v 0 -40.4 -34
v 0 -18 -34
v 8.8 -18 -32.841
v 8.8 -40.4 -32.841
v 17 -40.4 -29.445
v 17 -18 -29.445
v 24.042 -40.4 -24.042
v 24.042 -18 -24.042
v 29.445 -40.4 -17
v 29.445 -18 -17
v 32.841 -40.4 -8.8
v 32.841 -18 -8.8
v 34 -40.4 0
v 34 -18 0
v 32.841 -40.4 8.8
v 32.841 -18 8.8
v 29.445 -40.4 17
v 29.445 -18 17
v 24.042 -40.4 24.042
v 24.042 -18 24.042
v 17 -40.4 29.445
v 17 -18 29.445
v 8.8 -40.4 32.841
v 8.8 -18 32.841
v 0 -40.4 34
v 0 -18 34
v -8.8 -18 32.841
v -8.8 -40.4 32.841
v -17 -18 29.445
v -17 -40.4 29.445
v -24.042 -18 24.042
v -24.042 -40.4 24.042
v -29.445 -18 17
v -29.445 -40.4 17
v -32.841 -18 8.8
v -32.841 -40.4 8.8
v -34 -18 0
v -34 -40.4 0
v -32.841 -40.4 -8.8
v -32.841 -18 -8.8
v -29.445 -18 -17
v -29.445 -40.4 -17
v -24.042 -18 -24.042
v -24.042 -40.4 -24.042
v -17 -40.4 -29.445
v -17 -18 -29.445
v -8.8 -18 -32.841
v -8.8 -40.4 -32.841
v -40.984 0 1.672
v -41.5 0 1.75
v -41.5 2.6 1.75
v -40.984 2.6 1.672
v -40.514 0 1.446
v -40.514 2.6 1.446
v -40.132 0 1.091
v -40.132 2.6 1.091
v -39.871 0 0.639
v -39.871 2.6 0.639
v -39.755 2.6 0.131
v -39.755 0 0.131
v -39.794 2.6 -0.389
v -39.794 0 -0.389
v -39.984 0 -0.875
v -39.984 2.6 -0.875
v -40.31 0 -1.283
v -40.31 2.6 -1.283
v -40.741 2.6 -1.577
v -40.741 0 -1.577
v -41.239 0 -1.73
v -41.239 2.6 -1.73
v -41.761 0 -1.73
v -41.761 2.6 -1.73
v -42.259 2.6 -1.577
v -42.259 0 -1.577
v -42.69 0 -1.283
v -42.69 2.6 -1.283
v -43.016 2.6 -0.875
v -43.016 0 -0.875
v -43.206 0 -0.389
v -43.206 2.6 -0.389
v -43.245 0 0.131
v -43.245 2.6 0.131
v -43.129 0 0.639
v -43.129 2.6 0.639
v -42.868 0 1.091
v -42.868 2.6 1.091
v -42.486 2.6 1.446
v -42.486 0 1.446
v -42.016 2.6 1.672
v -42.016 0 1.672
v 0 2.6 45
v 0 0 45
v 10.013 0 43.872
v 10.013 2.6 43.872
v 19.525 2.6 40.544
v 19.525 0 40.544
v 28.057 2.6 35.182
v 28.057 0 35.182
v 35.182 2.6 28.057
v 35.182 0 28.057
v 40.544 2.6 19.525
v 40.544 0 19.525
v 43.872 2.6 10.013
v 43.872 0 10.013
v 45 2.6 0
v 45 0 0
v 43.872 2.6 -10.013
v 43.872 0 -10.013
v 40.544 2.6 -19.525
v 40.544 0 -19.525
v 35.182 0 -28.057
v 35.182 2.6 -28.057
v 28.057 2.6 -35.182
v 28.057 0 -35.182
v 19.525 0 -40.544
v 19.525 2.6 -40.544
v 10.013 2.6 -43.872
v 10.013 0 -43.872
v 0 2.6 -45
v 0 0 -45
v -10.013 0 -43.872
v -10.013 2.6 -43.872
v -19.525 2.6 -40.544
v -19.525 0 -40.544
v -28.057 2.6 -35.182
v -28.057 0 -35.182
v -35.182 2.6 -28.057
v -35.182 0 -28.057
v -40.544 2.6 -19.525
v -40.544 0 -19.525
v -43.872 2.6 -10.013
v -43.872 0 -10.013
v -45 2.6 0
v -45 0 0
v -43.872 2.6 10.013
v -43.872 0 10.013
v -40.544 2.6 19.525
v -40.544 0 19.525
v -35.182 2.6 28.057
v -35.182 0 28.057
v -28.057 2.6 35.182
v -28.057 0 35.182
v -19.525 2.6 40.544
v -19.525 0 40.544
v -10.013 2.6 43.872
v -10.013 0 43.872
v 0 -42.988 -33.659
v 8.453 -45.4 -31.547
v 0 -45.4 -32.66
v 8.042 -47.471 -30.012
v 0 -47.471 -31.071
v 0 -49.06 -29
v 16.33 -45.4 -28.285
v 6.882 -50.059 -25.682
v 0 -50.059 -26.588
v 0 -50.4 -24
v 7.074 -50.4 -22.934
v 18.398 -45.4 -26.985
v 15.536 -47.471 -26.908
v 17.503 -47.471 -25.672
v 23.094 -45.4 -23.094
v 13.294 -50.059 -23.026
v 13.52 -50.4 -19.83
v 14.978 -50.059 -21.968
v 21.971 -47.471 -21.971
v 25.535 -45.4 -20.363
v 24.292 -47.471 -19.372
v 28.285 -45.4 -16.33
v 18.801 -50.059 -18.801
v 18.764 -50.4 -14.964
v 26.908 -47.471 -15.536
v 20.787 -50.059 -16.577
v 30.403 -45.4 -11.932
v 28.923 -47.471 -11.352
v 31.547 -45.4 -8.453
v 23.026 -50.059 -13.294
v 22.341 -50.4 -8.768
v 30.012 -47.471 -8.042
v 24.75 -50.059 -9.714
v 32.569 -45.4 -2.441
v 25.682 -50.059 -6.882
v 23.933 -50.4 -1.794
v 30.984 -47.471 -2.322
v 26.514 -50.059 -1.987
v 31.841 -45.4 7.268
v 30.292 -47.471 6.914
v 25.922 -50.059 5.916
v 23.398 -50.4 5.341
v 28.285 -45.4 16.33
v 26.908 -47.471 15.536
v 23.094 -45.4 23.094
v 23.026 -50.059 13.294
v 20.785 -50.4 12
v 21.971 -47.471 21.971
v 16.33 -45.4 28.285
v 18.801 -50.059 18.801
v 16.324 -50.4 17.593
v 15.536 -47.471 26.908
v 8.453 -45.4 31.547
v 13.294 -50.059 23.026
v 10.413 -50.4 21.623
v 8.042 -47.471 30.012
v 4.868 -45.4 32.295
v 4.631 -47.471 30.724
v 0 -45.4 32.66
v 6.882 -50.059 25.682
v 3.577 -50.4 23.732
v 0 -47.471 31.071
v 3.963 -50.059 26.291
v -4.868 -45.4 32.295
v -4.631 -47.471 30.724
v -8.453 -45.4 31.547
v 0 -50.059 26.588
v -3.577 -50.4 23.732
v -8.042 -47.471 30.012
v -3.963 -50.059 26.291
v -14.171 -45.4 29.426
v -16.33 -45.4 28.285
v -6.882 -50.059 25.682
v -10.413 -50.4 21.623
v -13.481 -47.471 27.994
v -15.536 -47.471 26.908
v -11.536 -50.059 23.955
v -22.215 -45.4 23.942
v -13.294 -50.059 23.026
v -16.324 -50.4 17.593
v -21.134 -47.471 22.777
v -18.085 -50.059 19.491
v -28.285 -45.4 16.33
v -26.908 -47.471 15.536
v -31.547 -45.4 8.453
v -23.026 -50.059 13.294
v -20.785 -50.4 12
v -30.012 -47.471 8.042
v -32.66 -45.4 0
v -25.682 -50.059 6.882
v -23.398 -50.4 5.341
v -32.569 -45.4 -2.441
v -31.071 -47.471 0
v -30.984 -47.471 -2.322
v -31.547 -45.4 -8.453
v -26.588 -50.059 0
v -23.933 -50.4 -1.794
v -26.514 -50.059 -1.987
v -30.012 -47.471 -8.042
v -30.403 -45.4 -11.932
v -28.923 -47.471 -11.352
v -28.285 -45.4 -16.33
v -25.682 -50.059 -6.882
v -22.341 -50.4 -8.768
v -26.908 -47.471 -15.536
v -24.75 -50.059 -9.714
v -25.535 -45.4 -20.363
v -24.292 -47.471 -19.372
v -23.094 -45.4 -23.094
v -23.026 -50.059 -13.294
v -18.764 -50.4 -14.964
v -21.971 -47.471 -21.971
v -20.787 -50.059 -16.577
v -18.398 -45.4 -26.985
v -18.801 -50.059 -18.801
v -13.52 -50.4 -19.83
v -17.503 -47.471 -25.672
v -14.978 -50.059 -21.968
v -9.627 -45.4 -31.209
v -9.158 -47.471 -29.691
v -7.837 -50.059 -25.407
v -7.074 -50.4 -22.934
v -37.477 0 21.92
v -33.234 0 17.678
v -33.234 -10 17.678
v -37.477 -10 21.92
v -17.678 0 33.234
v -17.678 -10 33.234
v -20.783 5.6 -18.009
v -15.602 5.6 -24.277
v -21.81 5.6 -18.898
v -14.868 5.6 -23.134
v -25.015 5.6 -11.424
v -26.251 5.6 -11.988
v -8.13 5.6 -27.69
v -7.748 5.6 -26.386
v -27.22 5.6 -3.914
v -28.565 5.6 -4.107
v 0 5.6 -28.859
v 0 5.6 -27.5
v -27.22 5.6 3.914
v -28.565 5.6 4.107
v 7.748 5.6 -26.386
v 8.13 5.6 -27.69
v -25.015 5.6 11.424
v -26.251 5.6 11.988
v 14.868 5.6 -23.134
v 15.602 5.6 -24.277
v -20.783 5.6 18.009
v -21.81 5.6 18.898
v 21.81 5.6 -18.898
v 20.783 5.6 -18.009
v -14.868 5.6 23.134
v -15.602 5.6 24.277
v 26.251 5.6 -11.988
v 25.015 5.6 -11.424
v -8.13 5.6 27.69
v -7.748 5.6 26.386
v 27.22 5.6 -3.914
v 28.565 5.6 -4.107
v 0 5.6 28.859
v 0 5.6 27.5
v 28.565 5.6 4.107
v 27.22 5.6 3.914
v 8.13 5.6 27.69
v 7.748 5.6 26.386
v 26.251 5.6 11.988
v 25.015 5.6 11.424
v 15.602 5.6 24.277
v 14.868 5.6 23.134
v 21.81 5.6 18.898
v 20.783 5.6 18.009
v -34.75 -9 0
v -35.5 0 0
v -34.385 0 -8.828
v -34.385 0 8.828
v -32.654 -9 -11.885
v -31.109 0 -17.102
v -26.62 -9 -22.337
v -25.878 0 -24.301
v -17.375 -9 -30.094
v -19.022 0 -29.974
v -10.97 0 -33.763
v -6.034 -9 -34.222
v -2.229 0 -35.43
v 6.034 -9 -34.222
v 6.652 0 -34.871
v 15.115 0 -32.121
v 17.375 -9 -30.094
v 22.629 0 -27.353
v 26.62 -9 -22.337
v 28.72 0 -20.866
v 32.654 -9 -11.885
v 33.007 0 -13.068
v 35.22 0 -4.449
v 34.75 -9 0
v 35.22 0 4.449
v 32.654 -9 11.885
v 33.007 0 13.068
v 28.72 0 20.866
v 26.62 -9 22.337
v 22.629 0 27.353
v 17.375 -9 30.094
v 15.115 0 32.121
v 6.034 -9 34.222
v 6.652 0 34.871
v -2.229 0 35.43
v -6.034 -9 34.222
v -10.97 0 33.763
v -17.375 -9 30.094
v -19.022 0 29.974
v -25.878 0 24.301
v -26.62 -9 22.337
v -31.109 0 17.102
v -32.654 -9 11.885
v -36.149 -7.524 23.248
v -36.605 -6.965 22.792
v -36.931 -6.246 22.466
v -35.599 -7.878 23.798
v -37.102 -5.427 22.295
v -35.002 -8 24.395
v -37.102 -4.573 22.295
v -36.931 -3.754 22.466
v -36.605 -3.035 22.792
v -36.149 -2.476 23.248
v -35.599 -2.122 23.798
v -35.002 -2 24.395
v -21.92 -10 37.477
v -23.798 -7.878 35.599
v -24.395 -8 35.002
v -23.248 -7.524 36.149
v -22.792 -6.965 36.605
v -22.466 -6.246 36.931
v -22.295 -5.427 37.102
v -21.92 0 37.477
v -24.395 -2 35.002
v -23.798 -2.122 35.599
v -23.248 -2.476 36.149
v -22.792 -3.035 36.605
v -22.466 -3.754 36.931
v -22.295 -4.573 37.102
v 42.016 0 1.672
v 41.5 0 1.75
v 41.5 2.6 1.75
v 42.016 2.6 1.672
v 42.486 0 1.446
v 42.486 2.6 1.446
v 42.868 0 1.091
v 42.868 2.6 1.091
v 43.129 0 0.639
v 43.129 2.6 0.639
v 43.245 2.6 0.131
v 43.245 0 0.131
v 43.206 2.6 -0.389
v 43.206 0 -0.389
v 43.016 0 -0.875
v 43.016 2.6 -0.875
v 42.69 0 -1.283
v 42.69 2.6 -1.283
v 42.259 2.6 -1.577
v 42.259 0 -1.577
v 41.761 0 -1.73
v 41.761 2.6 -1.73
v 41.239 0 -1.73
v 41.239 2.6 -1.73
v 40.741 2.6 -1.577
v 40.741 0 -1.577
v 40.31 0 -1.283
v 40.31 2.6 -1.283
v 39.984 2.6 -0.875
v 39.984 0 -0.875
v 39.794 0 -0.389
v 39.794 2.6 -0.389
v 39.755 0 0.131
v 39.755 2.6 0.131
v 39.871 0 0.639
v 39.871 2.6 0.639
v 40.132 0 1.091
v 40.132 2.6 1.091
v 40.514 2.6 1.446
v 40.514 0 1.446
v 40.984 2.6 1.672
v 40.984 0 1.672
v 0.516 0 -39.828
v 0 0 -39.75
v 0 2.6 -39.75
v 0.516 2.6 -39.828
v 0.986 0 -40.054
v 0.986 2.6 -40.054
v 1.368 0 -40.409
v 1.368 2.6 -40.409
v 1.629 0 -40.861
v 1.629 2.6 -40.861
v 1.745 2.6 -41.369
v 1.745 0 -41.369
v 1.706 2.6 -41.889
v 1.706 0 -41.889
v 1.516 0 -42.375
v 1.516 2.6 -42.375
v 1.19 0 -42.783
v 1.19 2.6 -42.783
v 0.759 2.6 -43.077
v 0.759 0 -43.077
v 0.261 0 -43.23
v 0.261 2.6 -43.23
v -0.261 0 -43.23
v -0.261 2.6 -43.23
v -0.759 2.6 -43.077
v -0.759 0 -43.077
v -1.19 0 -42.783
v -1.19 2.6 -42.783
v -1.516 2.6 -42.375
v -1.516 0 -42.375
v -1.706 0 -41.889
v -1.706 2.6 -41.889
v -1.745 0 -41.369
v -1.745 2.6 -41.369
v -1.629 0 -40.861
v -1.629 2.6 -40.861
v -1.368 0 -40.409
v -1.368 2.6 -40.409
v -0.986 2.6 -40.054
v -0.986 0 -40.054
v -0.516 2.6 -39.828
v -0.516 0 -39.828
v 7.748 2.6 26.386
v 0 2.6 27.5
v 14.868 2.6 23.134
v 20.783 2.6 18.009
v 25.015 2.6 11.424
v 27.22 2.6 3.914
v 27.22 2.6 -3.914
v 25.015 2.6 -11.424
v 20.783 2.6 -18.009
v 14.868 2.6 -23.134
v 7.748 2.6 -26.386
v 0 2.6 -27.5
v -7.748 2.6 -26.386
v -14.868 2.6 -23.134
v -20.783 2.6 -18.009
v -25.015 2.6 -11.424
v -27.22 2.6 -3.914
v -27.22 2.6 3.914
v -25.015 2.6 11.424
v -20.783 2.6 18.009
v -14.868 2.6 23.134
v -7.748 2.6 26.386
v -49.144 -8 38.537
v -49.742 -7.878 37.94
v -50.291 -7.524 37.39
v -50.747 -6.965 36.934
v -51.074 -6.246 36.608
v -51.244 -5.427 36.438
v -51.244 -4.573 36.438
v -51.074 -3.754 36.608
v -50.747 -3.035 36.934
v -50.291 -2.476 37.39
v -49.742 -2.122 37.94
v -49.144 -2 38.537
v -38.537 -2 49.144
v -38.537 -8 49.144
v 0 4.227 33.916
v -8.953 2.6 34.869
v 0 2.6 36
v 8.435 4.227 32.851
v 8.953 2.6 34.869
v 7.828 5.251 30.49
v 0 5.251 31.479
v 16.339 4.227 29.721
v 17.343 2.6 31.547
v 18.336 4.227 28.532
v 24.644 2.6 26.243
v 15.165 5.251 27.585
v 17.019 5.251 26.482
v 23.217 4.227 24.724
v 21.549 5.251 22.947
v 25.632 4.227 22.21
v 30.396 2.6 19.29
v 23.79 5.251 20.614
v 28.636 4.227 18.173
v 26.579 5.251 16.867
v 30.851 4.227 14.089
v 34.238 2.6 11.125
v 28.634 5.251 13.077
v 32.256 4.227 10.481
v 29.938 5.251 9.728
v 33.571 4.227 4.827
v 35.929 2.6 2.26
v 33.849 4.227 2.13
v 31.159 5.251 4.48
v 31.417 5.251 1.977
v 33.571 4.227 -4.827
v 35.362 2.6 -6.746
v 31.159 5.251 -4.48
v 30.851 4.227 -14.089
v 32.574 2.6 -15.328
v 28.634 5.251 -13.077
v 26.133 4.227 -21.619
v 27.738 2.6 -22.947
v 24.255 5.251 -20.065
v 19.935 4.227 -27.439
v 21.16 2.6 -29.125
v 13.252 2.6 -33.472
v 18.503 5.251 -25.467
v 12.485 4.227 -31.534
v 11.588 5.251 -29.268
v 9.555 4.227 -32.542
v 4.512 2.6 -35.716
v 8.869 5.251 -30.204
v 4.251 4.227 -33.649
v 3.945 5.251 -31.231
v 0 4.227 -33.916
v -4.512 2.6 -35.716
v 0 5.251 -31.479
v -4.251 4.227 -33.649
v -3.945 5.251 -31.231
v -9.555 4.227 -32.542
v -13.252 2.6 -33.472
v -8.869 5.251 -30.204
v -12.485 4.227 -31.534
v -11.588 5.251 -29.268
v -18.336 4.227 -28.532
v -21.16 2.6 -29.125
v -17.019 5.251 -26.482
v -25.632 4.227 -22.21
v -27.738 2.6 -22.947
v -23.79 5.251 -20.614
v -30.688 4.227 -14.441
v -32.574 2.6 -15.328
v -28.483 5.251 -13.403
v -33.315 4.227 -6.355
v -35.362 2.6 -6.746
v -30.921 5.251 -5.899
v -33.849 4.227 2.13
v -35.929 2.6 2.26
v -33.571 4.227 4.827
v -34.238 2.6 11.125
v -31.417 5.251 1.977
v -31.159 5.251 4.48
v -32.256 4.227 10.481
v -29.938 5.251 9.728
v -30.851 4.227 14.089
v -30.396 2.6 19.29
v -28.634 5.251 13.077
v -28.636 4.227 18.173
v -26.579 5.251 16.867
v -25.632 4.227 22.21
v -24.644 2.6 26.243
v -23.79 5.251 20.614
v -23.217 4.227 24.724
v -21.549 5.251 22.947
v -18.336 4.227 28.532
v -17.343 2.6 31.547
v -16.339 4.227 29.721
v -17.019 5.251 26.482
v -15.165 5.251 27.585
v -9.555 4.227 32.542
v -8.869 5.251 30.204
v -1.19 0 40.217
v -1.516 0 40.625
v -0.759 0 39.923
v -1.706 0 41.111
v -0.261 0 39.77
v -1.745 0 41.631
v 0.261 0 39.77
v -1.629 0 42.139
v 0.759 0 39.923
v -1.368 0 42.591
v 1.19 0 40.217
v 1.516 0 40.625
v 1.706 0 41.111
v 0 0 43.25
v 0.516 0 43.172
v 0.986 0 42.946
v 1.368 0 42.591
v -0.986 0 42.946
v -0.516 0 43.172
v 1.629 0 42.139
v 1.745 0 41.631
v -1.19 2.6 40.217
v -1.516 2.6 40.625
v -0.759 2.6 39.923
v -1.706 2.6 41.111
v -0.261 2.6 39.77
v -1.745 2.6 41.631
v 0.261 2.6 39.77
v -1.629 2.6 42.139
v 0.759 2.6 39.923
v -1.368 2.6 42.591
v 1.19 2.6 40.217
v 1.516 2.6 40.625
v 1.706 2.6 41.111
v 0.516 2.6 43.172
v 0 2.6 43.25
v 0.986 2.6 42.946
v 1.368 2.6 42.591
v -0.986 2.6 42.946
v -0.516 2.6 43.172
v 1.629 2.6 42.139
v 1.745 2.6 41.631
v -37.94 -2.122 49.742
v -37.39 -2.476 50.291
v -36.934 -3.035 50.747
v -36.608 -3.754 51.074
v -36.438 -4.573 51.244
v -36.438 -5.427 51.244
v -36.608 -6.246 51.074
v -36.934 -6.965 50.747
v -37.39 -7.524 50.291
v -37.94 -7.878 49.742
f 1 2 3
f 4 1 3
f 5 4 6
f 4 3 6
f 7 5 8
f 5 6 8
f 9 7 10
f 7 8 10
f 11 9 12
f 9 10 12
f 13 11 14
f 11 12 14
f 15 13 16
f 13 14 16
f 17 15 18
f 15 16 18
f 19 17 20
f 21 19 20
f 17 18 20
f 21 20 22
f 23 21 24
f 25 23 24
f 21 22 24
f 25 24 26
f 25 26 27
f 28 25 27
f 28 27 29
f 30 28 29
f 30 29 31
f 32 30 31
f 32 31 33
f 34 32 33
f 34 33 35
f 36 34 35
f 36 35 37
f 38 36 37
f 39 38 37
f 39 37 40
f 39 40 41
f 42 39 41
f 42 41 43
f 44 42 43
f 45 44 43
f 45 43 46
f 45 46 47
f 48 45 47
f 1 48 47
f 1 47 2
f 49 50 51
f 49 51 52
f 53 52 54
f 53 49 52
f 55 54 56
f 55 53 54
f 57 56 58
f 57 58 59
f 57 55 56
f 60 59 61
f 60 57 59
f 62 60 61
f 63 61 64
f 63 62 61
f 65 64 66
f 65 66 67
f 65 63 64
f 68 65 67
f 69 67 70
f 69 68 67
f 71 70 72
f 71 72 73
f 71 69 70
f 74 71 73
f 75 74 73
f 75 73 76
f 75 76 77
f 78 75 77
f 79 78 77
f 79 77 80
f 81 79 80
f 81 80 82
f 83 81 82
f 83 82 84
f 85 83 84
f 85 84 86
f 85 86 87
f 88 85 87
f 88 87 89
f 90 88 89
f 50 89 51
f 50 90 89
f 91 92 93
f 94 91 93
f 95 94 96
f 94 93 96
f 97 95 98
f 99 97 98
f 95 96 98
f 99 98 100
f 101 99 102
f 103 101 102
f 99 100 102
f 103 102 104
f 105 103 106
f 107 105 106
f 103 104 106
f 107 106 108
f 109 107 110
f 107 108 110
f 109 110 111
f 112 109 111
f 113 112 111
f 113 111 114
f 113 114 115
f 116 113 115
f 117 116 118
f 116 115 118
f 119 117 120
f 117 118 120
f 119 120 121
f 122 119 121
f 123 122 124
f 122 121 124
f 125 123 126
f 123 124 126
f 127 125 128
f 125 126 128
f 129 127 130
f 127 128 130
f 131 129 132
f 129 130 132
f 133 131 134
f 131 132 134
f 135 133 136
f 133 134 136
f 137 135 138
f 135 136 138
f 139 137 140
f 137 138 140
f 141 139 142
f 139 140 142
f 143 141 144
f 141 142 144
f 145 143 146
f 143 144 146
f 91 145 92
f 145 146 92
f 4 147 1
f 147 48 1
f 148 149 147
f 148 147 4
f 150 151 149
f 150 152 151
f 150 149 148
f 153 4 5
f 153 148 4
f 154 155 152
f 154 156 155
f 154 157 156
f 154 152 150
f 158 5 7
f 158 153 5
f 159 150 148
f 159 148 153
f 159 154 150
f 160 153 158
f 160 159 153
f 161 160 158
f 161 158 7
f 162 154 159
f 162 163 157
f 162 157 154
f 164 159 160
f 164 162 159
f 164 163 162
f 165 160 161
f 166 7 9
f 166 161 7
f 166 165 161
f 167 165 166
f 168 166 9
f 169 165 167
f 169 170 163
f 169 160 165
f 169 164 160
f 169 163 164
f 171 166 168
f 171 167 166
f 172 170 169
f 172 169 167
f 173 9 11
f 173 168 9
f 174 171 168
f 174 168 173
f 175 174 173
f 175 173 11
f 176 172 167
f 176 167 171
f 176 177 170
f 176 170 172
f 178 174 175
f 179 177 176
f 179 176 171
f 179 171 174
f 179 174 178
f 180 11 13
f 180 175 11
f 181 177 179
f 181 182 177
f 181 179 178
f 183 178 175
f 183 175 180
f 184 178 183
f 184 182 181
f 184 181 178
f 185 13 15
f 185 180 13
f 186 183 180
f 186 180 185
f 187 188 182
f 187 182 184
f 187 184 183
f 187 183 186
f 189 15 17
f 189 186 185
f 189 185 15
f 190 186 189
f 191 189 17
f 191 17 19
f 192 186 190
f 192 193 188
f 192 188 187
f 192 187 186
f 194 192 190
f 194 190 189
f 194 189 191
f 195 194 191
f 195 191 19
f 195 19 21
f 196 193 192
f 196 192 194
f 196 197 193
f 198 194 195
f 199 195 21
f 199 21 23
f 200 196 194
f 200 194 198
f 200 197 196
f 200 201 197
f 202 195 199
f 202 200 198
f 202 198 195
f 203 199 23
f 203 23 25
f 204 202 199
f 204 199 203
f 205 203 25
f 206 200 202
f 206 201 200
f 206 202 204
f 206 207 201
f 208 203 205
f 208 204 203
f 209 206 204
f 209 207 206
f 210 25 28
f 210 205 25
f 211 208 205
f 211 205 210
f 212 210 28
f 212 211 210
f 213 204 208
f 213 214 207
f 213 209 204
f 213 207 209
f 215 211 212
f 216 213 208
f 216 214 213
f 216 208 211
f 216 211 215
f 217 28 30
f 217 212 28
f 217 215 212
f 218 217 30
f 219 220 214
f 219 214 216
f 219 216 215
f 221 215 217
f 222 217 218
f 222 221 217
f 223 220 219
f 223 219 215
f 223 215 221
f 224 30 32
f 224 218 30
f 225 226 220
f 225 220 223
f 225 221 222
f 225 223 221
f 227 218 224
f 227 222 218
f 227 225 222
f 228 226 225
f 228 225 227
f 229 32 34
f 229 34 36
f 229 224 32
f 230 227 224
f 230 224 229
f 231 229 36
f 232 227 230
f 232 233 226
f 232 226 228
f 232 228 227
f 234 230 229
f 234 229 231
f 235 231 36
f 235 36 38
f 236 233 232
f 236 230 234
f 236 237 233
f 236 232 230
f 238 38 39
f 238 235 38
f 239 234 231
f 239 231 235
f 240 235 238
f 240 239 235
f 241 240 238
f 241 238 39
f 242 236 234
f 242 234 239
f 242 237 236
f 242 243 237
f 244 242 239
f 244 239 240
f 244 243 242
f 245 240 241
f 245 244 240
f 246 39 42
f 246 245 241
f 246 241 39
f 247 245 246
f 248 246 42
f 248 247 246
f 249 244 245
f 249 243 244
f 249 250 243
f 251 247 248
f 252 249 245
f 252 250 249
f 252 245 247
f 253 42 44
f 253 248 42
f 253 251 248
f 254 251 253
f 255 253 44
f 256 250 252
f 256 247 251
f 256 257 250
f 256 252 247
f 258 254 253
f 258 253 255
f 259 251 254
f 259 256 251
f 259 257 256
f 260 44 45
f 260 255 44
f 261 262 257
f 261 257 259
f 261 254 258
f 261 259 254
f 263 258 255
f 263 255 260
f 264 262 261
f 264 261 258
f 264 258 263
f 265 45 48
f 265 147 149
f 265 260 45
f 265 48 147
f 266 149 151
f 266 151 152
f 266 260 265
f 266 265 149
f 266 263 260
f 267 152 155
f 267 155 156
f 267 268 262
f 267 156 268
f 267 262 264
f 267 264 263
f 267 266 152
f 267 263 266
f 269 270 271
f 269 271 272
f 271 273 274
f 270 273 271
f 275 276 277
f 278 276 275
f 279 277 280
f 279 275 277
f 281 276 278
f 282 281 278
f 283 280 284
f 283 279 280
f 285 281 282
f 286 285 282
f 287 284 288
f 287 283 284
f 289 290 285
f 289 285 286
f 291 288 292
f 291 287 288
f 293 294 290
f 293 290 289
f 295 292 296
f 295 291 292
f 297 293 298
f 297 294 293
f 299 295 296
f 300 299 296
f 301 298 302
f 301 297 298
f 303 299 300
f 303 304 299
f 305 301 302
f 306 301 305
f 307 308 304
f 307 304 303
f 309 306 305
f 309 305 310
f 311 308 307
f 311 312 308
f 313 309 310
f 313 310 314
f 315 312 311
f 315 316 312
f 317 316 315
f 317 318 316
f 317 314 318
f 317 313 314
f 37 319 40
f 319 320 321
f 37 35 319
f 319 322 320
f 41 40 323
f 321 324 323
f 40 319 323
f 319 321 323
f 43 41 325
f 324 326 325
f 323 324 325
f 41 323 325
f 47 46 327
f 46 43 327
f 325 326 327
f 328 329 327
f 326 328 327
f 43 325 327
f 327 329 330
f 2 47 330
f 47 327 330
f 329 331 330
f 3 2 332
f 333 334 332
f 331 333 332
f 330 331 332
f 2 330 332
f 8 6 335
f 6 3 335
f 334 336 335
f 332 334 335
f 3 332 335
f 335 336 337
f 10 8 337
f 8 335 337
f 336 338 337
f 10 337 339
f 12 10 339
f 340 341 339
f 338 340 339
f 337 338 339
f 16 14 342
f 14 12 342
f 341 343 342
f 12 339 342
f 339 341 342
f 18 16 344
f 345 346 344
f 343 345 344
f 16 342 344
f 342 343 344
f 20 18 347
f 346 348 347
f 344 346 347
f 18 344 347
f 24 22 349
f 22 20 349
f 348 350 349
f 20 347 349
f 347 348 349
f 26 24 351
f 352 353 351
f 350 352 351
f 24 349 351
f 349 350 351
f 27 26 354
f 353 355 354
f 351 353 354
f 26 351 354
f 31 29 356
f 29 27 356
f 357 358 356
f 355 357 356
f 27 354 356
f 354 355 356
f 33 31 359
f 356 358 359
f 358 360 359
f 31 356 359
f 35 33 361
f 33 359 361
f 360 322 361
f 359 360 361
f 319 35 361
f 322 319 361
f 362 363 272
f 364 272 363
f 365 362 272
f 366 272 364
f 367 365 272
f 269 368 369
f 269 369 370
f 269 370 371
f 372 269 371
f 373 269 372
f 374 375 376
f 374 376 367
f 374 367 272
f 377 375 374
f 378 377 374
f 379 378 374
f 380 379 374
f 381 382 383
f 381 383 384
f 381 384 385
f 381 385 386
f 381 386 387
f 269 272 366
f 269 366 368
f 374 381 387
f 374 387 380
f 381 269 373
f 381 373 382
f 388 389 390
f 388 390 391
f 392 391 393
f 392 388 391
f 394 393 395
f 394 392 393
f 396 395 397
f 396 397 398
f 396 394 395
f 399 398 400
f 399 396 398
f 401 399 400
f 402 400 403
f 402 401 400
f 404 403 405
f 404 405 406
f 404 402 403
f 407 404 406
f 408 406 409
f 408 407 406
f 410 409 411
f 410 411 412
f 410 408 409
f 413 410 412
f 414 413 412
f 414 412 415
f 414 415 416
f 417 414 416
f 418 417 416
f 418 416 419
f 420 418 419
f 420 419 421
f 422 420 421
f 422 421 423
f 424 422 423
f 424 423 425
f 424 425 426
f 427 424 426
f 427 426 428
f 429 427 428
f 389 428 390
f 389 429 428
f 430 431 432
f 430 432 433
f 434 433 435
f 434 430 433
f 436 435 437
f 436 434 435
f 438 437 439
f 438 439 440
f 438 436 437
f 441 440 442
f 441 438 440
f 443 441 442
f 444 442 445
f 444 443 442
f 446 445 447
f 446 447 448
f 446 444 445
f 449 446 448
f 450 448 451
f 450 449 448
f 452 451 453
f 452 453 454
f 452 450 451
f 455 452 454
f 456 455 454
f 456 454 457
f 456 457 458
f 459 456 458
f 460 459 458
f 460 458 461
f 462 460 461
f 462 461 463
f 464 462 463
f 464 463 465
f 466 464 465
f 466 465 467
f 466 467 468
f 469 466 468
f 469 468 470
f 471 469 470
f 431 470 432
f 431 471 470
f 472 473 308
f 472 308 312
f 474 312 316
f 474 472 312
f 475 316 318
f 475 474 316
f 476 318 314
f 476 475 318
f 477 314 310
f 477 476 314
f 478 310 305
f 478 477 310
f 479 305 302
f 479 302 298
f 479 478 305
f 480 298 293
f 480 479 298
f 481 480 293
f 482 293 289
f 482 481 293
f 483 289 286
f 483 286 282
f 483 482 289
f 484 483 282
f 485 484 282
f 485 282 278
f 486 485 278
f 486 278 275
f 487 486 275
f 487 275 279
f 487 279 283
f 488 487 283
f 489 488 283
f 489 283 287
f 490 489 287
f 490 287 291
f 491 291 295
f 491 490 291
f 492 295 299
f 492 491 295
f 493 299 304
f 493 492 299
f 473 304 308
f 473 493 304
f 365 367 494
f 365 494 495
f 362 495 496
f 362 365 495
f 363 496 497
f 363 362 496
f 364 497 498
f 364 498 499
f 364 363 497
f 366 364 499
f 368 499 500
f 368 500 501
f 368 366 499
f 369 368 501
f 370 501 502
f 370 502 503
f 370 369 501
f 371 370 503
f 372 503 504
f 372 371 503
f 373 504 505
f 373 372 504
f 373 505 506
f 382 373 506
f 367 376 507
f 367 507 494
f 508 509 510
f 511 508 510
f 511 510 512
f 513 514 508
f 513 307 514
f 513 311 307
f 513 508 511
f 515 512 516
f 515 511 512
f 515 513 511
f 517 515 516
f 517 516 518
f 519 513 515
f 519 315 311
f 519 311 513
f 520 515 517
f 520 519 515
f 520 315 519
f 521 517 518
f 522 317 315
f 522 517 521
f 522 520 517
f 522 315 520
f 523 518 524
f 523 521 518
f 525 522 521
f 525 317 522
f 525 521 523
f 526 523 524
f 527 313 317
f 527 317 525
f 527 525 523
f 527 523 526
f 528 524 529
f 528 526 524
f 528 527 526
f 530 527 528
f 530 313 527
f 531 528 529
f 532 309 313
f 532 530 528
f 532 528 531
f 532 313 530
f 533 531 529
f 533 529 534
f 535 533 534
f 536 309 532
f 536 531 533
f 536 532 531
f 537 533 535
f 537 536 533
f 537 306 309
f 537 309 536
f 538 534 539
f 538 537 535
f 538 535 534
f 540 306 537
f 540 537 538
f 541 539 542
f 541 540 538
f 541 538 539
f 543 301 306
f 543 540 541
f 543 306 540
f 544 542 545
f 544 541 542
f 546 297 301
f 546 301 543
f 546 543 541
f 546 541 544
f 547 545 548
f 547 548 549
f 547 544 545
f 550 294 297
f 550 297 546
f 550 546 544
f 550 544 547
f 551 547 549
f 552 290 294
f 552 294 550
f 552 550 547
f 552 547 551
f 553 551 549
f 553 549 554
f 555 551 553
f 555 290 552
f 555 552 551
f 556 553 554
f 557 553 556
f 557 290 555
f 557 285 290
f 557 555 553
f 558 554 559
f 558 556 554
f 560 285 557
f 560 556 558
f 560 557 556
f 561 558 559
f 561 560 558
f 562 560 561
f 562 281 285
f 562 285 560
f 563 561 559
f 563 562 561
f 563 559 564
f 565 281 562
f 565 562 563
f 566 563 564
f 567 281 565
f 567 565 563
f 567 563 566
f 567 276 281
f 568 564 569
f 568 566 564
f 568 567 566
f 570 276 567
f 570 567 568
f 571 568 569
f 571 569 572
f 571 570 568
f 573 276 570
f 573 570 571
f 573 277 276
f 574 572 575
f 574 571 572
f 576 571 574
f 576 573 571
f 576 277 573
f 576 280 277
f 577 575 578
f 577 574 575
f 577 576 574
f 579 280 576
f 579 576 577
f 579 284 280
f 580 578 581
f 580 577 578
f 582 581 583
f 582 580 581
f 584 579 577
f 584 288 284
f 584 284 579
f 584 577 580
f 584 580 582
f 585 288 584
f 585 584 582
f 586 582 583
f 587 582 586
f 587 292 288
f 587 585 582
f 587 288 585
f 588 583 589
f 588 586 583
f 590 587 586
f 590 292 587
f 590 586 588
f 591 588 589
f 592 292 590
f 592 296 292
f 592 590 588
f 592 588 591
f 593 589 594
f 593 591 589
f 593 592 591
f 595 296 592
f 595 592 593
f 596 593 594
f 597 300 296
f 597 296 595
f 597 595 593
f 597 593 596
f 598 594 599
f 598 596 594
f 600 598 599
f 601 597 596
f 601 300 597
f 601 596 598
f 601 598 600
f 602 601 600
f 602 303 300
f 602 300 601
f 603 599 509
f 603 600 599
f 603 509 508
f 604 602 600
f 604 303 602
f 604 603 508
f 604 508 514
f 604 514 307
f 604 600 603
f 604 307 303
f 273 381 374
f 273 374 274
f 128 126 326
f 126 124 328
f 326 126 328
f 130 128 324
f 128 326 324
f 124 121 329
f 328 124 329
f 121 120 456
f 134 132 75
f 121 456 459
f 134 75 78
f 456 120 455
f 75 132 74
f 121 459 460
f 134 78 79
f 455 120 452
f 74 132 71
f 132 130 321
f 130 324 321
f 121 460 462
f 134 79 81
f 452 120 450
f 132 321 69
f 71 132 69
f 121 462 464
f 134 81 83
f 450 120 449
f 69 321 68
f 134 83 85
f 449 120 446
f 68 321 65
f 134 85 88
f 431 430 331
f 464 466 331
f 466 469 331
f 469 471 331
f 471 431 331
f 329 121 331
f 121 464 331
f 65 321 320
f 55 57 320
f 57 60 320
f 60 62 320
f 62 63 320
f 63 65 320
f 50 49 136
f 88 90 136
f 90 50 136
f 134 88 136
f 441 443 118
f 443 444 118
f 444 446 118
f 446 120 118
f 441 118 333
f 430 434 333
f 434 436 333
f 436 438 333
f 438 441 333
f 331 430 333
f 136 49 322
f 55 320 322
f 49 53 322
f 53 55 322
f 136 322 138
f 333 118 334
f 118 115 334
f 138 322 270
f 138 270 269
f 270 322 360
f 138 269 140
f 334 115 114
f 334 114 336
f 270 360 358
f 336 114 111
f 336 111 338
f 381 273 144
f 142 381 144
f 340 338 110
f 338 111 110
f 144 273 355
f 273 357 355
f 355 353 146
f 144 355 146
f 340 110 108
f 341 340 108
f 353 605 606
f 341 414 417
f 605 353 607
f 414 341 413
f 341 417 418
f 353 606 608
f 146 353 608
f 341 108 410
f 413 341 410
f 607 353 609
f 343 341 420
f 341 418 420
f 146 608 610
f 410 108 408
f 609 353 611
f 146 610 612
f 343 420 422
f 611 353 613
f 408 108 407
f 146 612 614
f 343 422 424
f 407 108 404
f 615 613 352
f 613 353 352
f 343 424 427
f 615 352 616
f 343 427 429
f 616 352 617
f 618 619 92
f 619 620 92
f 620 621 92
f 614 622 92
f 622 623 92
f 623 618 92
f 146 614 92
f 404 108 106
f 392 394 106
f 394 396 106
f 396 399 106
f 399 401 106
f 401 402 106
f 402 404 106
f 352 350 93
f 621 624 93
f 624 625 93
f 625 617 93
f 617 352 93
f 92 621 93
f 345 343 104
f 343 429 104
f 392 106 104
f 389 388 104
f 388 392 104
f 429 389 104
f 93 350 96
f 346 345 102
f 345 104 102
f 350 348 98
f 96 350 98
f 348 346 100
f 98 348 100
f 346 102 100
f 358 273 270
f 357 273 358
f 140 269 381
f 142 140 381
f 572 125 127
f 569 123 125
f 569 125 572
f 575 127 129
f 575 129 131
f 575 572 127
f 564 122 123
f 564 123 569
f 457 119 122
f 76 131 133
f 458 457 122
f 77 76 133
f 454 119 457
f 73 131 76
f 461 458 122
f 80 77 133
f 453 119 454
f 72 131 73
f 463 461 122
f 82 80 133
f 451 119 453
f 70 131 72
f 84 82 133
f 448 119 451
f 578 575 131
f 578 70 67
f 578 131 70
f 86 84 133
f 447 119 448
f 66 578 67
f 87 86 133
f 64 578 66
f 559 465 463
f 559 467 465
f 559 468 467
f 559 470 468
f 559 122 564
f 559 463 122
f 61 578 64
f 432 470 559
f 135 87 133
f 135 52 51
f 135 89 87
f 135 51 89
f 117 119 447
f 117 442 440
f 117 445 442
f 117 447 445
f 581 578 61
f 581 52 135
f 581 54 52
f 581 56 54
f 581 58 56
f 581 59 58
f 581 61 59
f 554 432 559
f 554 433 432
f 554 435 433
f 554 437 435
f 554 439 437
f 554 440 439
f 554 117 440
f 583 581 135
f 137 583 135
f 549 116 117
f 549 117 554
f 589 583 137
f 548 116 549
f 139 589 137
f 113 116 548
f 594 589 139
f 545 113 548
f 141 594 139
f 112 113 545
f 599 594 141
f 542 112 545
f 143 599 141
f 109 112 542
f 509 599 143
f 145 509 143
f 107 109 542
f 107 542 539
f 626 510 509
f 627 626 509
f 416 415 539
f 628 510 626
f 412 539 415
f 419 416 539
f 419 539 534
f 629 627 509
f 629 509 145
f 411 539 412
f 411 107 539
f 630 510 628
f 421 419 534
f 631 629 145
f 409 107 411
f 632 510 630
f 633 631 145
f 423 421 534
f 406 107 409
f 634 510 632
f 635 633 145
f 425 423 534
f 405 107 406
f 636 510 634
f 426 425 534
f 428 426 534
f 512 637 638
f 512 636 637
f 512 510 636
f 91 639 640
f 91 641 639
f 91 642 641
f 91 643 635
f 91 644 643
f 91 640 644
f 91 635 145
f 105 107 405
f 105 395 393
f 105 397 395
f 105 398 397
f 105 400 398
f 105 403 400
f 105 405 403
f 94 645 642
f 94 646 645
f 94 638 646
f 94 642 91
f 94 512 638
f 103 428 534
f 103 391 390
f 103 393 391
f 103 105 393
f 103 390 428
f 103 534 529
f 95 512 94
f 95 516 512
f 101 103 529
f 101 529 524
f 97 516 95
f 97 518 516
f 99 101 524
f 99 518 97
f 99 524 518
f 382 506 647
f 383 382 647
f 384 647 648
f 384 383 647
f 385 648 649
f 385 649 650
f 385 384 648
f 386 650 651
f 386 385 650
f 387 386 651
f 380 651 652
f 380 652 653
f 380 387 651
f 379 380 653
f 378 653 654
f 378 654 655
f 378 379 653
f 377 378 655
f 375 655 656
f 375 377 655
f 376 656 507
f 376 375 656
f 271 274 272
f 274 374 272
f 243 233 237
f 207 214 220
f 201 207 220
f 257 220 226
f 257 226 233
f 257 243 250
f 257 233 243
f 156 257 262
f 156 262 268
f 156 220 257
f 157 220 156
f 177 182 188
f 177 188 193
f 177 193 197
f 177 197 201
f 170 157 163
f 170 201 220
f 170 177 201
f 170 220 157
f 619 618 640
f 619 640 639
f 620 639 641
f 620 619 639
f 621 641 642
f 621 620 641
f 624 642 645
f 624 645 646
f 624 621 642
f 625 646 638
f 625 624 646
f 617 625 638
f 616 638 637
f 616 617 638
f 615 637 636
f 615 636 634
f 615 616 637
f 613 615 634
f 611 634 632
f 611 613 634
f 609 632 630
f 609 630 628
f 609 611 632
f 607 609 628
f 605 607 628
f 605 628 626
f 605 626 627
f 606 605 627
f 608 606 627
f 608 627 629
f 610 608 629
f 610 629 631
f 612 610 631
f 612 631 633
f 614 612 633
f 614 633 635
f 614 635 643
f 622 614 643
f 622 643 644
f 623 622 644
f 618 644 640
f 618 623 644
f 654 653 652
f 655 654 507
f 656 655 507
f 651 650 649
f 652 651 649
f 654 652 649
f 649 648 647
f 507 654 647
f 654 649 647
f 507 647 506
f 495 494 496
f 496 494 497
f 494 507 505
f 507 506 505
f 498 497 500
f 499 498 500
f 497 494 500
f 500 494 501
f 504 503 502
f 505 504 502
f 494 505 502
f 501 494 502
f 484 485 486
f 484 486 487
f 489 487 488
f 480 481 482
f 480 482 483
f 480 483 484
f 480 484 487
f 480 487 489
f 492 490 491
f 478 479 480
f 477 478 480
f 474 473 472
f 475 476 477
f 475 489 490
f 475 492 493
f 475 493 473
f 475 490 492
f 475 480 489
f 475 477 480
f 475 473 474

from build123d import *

# Parameters (mm, degrees)
SKETCH_1_R      = 45
SKETCH_1_R_2    = 1.75
EXTRUDE_1_DEPTH = 2.6
SKETCH_3_R      = 34
SKETCH_2_R      = 35.5
SKETCH_4_R      = 34
EXTRUDE_2_DEPTH = 32.4
FILLET_1_R      = 10
EXTRUDE_3_DEPTH = 10
EXTRUDE_4_DEPTH = 20
SKETCH_7_R      = 36
SKETCH_7_R_2    = 27.5
EXTRUDE_5_DEPTH = 3
FILLET_2_R      = 10


with BuildPart() as part:
    # 草图1 → 凸台-拉伸1 (new body)
    with BuildSketch(Plane(origin=(0, 0, 0), x_dir=(1, 0, 0), z_dir=(0, 1, 0))):
        with Locations(Location((0, 0, 0), (0, 0, 270))):
            Circle(SKETCH_1_R)
        with Locations(Location((41.5, 0, 0), (0, 0, 270))):
            Circle(SKETCH_1_R_2, mode=Mode.SUBTRACT)
        with Locations(Location((-41.5, 0, 0), (0, 0, 270))):
            Circle(SKETCH_1_R_2, mode=Mode.SUBTRACT)
        with Locations(Location((0, 41.5, 0), (0, 0, 270))):
            Circle(SKETCH_1_R_2, mode=Mode.SUBTRACT)
        with Locations(Location((0, -41.5, 0), (0, 0, 270))):
            Circle(SKETCH_1_R_2, mode=Mode.SUBTRACT)
    extrude(amount=EXTRUDE_1_DEPTH)

    # 草图3 → 放样1 section 0
    with BuildSketch(Plane(origin=(0, -18, 0), x_dir=(-1, 0, 0), z_dir=(0, -1, 0))):
        Circle(SKETCH_3_R)
    # 草图2 → 放样1 section 1
    with BuildSketch(Plane.XZ):
        Circle(SKETCH_2_R)
    loft()

    # 草图4 → 凸台-拉伸2 (add)
    with BuildSketch(Plane.XZ.offset(18)):
        with Locations(Location((0, 0, 0), (0, 0, 270))):
            Circle(SKETCH_4_R)
    extrude(amount=EXTRUDE_2_DEPTH)

    # 圆角1
    fillet_1_edges = [part.edges().sort_by_distance(p)[0] for p in [
        (0, -50.4, 34),
    ]]
    fillet(fillet_1_edges, radius=FILLET_1_R)

    # 草图5 → 凸台-拉伸3 (add)
    with BuildSketch(Plane.XZ):
        Polygon((-17.67766953, 33.234018716), (-33.234018716, 17.67766953), (-37.476659403, 21.920310217), (-21.920310217, 37.476659403), align=None)
    extrude(amount=EXTRUDE_3_DEPTH)

    # 草图6 → 凸台-拉伸4 (add)
    with BuildSketch(Plane(origin=(-29.69848481, 0, 29.69848481), x_dir=(0.7071067811865436, 0, 0.7071067811865515), z_dir=(-0.7071067811865515, 0, 0.7071067811865436))):
        with BuildLine():
            Line((-7.5, -2), (7.5, -2))
            ThreePointArc((7.5, -2), (10.5, -5), (7.5, -8))
            Line((7.5, -8), (-7.5, -8))
            ThreePointArc((-7.5, -8), (-10.5, -5), (-7.5, -2))
        make_face()
    extrude(amount=EXTRUDE_4_DEPTH)

    # 草图7 → 凸台-拉伸5 (add)
    with BuildSketch(Plane(origin=(0, 2.6, 0), x_dir=(1, 0, 0), z_dir=(0, 1, 0))):
        with Locations(Location((0, 0, 0), (0, 0, 270))):
            Circle(SKETCH_7_R)
        with Locations(Location((0, 0, 0), (0, 0, 270))):
            Circle(SKETCH_7_R_2, mode=Mode.SUBTRACT)
    extrude(amount=EXTRUDE_5_DEPTH)

    # 圆角2
    # the kernel refuses this fillet: 10 mm, written as the material it takes off along each edge
    with BuildSketch(Plane(origin=(0, 5.6, 0), x_dir=(0, 0, 1), z_dir=(-1, 0, 0))) as fillet_2_piece_1:
        with BuildLine():
            CenterArc((28.858571571, -10), FILLET_2_R, 44.427004001, 45.572995999)
            Line((28.858571571, 0), (28.858571571, 0.2))
            Line((28.858571571, 0.2), (36, 0.2))
            Line((36, 0.2), (36.2, 0))
            ThreePointArc((36.2, 0), (36.2, -1.5), (36.142828569, -2.86))
            Line((36.142828569, -2.86), (36, -3))
        make_face()
    revolve(axis=Axis((0, 5.6, 0), (0, 1, 0)), mode=Mode.SUBTRACT)


solid = part.part
